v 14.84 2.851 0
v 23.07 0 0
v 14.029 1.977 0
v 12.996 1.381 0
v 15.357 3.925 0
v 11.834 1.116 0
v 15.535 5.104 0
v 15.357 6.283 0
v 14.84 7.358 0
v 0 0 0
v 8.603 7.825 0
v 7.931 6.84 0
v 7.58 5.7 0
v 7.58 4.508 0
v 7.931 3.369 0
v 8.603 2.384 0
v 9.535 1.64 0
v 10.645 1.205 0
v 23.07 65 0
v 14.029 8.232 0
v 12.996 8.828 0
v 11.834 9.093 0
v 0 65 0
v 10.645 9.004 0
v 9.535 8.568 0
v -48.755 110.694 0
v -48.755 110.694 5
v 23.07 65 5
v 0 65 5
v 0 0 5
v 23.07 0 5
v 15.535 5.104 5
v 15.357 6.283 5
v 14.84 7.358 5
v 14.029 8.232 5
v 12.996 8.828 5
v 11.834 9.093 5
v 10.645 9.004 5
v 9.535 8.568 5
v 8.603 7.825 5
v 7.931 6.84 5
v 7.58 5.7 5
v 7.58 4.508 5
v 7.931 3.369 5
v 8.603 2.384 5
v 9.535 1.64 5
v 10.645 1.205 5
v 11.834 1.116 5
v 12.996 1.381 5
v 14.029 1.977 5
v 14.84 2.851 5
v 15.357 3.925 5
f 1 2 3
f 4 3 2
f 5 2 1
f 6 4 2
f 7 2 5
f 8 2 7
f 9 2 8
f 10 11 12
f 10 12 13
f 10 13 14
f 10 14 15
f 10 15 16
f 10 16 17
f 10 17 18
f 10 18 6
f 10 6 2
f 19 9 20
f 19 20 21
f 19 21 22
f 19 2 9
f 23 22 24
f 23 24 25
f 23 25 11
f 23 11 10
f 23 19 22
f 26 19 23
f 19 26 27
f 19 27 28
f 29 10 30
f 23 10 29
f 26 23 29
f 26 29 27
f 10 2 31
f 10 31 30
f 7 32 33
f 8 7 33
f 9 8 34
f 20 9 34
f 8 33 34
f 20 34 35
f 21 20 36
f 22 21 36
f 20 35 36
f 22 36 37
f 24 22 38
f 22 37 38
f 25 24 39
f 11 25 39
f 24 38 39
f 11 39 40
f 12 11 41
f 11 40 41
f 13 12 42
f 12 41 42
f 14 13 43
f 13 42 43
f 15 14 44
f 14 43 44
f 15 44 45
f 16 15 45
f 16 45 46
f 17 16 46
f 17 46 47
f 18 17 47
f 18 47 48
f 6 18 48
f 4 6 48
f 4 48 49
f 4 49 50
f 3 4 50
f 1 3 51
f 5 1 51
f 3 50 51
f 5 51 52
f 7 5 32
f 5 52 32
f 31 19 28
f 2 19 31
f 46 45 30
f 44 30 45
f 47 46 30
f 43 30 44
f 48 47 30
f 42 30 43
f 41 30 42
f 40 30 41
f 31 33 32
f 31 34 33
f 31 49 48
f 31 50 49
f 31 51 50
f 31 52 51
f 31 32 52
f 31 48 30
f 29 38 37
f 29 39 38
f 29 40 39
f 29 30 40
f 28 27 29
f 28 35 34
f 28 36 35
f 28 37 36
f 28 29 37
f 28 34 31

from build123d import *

# Parameters (mm, degrees)
EXTRUDE_1_DEPTH     = 5
SKETCH_2_R          = 4
CUT_EXTRUDE_1_DEPTH = 5
SKETCH_3_R          = 4
EXTRUDE_2_DEPTH     = 5


with BuildPart() as part:
    # 草图1 → 凸台-拉伸1 (new body)
    with BuildSketch(Plane.XY):
        Polygon((0, 0), (0, 65), (-48.75546427, 110.693878657), (23.07, 65), (23.07, 0), align=None)
    extrude(amount=EXTRUDE_1_DEPTH)

    # 草图2 → 切除-拉伸1 (cut)
    with BuildSketch(Plane.XY.offset(5)):
        with Locations((11.535, 5.104320519)):
            Circle(SKETCH_2_R)
        with Locations(Location((11.535, 59.895679481, 0), (0, 0, 180))):
            Circle(SKETCH_2_R)
    extrude(amount=-CUT_EXTRUDE_1_DEPTH, mode=Mode.SUBTRACT)

    # 草图3 → 凸台-拉伸2 (add)
    with BuildSketch(Plane.XY.offset(5)):
        with Locations((11.535, 59.895679481)):
            Circle(SKETCH_3_R)
    extrude(amount=-EXTRUDE_2_DEPTH)


solid = part.part
